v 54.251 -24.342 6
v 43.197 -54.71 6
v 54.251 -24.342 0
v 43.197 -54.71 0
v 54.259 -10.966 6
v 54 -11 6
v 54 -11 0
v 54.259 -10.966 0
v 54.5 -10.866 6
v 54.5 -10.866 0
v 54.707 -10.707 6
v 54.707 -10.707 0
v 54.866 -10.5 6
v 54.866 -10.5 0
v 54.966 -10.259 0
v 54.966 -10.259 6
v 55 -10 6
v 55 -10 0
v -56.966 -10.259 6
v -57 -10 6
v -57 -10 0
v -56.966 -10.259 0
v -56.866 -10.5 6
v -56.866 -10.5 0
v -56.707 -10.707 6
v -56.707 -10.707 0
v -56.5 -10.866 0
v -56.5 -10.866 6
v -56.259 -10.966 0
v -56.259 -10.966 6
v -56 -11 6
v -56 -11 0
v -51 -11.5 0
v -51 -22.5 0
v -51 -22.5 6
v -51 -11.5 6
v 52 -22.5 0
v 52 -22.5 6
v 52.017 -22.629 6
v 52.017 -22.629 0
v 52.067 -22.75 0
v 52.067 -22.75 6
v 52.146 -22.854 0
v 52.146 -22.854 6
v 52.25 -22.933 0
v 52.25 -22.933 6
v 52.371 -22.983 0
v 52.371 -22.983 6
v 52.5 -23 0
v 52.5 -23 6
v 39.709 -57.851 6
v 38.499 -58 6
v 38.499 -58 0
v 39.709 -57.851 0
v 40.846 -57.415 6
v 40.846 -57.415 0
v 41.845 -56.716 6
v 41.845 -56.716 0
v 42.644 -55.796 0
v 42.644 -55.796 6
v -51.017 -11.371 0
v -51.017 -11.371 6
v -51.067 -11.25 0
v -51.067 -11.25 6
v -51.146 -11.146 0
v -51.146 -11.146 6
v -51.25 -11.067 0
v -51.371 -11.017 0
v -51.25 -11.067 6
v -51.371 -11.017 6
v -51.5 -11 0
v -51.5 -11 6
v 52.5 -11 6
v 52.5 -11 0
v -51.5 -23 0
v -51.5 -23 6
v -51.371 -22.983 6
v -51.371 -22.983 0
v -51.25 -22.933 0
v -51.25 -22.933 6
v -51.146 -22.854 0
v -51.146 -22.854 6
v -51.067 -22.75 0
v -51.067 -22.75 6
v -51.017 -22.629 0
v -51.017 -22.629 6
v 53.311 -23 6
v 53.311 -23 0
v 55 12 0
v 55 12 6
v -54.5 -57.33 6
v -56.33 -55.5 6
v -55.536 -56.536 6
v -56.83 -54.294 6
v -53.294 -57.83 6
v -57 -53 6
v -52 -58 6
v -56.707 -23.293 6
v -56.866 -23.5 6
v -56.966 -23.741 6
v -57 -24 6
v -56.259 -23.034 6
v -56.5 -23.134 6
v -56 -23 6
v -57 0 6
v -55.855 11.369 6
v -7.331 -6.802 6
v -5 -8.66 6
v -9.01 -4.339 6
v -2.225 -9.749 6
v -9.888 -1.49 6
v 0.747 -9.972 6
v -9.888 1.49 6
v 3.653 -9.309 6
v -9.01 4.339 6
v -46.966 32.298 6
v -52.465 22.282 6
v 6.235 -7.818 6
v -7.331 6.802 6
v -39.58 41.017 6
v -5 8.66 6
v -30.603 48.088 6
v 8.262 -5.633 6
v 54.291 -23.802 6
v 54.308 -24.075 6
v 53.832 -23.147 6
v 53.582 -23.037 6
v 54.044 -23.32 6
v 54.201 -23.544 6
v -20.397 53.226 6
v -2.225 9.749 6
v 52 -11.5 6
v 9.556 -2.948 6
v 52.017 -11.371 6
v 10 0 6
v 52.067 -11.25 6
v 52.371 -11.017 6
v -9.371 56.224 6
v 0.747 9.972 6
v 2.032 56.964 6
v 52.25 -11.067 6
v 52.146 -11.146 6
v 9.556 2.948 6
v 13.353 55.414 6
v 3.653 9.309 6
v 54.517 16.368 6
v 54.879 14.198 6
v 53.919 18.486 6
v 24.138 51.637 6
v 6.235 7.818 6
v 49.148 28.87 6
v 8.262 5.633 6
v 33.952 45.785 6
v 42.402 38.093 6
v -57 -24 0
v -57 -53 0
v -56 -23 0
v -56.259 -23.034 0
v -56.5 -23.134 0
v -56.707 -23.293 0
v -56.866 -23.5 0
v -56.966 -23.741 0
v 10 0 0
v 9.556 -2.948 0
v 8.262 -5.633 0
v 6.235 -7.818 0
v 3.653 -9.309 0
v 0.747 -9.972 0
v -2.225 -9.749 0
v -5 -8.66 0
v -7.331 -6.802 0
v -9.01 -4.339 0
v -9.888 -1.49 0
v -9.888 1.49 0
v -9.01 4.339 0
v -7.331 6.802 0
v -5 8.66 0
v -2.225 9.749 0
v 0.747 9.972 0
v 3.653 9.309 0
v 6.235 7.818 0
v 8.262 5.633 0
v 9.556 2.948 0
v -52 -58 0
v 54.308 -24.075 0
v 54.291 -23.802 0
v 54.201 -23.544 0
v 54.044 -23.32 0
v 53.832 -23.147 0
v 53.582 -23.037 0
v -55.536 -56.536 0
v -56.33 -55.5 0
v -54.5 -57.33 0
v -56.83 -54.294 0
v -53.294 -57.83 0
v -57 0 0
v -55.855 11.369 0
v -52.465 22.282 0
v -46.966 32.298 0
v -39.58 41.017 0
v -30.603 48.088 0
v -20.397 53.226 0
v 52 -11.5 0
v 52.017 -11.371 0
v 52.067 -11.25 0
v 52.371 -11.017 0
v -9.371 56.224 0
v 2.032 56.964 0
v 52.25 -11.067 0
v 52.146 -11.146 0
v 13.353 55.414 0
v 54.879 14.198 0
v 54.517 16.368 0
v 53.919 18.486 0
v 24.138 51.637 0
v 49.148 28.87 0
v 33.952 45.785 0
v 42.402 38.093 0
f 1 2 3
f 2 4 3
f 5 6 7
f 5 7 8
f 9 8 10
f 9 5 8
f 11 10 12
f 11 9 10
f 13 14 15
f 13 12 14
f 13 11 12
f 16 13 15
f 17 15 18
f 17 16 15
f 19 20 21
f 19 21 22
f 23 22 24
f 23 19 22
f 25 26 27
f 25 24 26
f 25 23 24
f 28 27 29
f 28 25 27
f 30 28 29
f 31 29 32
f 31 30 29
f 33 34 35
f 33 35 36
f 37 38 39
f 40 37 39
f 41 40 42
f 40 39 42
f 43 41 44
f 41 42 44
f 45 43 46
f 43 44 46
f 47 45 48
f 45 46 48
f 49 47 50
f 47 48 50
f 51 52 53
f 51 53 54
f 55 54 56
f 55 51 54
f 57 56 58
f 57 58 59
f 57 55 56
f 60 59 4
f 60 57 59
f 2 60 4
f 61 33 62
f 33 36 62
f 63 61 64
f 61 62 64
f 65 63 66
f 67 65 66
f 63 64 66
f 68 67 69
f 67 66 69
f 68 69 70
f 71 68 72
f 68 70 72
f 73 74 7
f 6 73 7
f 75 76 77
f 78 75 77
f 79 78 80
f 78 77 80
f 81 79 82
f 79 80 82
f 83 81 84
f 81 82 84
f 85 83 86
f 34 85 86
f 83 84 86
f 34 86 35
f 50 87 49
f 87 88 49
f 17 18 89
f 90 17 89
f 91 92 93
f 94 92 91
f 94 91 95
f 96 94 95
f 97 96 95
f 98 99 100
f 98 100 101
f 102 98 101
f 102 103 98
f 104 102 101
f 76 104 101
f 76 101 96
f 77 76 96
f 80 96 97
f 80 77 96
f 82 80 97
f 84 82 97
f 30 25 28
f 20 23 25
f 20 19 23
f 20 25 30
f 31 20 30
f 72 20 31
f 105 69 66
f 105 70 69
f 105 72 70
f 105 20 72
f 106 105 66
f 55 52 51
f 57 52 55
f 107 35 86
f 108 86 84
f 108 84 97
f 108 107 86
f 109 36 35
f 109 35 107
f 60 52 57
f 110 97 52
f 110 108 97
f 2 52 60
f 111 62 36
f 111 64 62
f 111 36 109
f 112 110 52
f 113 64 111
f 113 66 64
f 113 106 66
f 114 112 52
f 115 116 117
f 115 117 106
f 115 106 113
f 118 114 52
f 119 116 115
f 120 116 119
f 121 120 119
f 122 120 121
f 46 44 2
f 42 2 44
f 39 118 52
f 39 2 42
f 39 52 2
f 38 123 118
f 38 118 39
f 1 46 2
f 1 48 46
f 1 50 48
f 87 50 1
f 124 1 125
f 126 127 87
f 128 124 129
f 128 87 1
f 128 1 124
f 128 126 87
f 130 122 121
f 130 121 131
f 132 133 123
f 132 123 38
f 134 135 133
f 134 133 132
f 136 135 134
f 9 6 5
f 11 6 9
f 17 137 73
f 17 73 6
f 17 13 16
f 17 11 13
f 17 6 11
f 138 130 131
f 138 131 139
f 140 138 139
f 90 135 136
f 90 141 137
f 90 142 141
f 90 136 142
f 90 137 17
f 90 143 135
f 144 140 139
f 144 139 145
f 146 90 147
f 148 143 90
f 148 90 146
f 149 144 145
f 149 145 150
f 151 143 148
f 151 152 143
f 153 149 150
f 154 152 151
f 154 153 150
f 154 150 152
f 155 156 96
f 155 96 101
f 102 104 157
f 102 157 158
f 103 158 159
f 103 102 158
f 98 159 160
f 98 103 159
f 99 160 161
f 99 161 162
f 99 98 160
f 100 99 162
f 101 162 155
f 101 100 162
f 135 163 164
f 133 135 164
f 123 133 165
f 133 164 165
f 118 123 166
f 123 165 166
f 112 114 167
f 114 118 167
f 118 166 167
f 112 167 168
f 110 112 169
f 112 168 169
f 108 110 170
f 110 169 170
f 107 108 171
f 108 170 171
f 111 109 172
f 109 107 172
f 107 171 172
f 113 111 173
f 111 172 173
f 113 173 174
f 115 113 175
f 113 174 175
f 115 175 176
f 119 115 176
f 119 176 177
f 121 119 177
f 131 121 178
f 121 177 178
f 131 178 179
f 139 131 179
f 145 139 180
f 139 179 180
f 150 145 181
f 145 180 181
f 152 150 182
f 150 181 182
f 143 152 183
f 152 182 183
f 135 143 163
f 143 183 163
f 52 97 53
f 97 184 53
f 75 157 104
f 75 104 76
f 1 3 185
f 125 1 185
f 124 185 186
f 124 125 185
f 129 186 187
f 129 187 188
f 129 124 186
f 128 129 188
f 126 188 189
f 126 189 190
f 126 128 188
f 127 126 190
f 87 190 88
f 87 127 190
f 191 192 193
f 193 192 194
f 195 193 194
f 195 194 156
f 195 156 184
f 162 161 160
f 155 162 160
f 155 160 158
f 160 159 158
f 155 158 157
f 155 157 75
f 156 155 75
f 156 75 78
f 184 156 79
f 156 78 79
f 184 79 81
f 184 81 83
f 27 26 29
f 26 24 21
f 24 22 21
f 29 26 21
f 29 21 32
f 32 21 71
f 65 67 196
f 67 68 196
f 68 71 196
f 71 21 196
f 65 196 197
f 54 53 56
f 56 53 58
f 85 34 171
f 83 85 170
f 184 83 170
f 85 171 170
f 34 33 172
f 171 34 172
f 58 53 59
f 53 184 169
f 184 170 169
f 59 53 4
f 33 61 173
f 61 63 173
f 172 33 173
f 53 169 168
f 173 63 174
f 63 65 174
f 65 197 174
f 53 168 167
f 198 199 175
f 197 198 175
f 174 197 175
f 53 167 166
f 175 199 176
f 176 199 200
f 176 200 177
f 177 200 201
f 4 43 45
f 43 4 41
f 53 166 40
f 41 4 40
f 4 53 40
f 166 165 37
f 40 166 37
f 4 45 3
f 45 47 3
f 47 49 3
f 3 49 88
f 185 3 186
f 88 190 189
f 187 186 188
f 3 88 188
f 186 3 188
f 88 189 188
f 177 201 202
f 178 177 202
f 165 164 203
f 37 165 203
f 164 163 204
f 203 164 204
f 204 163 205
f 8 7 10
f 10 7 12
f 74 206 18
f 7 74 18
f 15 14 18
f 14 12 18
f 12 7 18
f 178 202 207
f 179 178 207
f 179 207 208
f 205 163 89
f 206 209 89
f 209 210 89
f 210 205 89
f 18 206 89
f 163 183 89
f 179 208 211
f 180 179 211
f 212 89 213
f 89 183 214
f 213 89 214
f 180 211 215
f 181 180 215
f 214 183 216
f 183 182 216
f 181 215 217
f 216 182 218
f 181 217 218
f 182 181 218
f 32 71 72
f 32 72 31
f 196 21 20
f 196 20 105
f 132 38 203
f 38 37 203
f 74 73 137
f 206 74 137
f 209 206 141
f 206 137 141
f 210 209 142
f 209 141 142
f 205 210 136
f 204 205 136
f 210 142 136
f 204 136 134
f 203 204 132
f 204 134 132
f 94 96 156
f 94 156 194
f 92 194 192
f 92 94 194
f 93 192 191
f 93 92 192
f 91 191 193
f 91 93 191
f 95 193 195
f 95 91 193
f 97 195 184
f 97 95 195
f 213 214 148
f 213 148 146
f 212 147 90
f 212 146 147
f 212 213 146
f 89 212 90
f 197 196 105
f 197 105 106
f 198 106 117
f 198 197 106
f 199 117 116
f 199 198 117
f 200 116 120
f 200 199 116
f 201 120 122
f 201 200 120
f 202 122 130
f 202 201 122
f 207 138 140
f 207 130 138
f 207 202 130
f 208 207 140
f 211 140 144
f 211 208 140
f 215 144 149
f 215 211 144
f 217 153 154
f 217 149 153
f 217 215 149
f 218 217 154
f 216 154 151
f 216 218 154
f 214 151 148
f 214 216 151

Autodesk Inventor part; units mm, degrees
ref_plane "YZ Plane" through (0, 0, 0) normal (1, 0, 0) x (0, 1, 0)
ref_plane "XZ Plane" through (0, 0, 0) normal (0, 1, 0) x (-1, 0, 0)
ref_plane "XY Plane" through (0, 0, 0) normal (0, 0, 1) x (1, 0, 0)
sketch "Sketch1" plane through (0, 0, 0) normal (0, 0, 1) x (1, 0, 0)
  circle A0 centre (0, 0) radius 10
  line L0 (-57, -58) -> (42, -58)
  line L1 (42, -58) -> (54.739, -23)
  line L2 (54.739, -23) -> (52, -23)
  line L3 (52, -23) -> (52, -11)
  line L4 (52, -11) -> (55, -11)
  line L5 (55, -11) -> (55, 12)
  line L6 (-57, -58) -> (-57, -23)
  line L7 (-57, -23) -> (-51, -23)
  line L8 (-51, -23) -> (-51, -11)
  line L9 (-51, -11) -> (-57, -11)
  line L10 (-57, -11) -> (-57, 0)
  arc A1 (53.9189, 18.4865) -> (-57, 0) centre (0, 0) ccw
  arc A2 (55, 12) -> (53.9189, 18.4865) centre (35, 12) ccw
  dimension "d0" = 20
  dimension "d1" = 57
  dimension "d2" = 20
  dimension "d3" = 99
  dimension "d4" = 6
  dimension "d5" = 110
  dimension "d6" = 3
  dimension "d7" = 12
  dimension "d8" = 58
  dimension "d9" = 12
  dimension "d10" = 55
  dimension "d11" = 47
extrude "Extrusion1" add sketch "Sketch1" along normal blind 6
fillet "Fillet1" radius 0.5 4 edges at (52, -23, 3) (52, -11, 3) (-51, -11, 3) (-51, -23, 3)
fillet "Fillet2" radius 1 4 edges at (-57, -11, 3) (-57, -23, 3) (55, -11, 3) (54.739, -23, 3)
fillet "Fillet3" radius 5 2 edges at (42, -58, 3) (-57, -58, 3)
properties part number "NPT Flange Inner"
